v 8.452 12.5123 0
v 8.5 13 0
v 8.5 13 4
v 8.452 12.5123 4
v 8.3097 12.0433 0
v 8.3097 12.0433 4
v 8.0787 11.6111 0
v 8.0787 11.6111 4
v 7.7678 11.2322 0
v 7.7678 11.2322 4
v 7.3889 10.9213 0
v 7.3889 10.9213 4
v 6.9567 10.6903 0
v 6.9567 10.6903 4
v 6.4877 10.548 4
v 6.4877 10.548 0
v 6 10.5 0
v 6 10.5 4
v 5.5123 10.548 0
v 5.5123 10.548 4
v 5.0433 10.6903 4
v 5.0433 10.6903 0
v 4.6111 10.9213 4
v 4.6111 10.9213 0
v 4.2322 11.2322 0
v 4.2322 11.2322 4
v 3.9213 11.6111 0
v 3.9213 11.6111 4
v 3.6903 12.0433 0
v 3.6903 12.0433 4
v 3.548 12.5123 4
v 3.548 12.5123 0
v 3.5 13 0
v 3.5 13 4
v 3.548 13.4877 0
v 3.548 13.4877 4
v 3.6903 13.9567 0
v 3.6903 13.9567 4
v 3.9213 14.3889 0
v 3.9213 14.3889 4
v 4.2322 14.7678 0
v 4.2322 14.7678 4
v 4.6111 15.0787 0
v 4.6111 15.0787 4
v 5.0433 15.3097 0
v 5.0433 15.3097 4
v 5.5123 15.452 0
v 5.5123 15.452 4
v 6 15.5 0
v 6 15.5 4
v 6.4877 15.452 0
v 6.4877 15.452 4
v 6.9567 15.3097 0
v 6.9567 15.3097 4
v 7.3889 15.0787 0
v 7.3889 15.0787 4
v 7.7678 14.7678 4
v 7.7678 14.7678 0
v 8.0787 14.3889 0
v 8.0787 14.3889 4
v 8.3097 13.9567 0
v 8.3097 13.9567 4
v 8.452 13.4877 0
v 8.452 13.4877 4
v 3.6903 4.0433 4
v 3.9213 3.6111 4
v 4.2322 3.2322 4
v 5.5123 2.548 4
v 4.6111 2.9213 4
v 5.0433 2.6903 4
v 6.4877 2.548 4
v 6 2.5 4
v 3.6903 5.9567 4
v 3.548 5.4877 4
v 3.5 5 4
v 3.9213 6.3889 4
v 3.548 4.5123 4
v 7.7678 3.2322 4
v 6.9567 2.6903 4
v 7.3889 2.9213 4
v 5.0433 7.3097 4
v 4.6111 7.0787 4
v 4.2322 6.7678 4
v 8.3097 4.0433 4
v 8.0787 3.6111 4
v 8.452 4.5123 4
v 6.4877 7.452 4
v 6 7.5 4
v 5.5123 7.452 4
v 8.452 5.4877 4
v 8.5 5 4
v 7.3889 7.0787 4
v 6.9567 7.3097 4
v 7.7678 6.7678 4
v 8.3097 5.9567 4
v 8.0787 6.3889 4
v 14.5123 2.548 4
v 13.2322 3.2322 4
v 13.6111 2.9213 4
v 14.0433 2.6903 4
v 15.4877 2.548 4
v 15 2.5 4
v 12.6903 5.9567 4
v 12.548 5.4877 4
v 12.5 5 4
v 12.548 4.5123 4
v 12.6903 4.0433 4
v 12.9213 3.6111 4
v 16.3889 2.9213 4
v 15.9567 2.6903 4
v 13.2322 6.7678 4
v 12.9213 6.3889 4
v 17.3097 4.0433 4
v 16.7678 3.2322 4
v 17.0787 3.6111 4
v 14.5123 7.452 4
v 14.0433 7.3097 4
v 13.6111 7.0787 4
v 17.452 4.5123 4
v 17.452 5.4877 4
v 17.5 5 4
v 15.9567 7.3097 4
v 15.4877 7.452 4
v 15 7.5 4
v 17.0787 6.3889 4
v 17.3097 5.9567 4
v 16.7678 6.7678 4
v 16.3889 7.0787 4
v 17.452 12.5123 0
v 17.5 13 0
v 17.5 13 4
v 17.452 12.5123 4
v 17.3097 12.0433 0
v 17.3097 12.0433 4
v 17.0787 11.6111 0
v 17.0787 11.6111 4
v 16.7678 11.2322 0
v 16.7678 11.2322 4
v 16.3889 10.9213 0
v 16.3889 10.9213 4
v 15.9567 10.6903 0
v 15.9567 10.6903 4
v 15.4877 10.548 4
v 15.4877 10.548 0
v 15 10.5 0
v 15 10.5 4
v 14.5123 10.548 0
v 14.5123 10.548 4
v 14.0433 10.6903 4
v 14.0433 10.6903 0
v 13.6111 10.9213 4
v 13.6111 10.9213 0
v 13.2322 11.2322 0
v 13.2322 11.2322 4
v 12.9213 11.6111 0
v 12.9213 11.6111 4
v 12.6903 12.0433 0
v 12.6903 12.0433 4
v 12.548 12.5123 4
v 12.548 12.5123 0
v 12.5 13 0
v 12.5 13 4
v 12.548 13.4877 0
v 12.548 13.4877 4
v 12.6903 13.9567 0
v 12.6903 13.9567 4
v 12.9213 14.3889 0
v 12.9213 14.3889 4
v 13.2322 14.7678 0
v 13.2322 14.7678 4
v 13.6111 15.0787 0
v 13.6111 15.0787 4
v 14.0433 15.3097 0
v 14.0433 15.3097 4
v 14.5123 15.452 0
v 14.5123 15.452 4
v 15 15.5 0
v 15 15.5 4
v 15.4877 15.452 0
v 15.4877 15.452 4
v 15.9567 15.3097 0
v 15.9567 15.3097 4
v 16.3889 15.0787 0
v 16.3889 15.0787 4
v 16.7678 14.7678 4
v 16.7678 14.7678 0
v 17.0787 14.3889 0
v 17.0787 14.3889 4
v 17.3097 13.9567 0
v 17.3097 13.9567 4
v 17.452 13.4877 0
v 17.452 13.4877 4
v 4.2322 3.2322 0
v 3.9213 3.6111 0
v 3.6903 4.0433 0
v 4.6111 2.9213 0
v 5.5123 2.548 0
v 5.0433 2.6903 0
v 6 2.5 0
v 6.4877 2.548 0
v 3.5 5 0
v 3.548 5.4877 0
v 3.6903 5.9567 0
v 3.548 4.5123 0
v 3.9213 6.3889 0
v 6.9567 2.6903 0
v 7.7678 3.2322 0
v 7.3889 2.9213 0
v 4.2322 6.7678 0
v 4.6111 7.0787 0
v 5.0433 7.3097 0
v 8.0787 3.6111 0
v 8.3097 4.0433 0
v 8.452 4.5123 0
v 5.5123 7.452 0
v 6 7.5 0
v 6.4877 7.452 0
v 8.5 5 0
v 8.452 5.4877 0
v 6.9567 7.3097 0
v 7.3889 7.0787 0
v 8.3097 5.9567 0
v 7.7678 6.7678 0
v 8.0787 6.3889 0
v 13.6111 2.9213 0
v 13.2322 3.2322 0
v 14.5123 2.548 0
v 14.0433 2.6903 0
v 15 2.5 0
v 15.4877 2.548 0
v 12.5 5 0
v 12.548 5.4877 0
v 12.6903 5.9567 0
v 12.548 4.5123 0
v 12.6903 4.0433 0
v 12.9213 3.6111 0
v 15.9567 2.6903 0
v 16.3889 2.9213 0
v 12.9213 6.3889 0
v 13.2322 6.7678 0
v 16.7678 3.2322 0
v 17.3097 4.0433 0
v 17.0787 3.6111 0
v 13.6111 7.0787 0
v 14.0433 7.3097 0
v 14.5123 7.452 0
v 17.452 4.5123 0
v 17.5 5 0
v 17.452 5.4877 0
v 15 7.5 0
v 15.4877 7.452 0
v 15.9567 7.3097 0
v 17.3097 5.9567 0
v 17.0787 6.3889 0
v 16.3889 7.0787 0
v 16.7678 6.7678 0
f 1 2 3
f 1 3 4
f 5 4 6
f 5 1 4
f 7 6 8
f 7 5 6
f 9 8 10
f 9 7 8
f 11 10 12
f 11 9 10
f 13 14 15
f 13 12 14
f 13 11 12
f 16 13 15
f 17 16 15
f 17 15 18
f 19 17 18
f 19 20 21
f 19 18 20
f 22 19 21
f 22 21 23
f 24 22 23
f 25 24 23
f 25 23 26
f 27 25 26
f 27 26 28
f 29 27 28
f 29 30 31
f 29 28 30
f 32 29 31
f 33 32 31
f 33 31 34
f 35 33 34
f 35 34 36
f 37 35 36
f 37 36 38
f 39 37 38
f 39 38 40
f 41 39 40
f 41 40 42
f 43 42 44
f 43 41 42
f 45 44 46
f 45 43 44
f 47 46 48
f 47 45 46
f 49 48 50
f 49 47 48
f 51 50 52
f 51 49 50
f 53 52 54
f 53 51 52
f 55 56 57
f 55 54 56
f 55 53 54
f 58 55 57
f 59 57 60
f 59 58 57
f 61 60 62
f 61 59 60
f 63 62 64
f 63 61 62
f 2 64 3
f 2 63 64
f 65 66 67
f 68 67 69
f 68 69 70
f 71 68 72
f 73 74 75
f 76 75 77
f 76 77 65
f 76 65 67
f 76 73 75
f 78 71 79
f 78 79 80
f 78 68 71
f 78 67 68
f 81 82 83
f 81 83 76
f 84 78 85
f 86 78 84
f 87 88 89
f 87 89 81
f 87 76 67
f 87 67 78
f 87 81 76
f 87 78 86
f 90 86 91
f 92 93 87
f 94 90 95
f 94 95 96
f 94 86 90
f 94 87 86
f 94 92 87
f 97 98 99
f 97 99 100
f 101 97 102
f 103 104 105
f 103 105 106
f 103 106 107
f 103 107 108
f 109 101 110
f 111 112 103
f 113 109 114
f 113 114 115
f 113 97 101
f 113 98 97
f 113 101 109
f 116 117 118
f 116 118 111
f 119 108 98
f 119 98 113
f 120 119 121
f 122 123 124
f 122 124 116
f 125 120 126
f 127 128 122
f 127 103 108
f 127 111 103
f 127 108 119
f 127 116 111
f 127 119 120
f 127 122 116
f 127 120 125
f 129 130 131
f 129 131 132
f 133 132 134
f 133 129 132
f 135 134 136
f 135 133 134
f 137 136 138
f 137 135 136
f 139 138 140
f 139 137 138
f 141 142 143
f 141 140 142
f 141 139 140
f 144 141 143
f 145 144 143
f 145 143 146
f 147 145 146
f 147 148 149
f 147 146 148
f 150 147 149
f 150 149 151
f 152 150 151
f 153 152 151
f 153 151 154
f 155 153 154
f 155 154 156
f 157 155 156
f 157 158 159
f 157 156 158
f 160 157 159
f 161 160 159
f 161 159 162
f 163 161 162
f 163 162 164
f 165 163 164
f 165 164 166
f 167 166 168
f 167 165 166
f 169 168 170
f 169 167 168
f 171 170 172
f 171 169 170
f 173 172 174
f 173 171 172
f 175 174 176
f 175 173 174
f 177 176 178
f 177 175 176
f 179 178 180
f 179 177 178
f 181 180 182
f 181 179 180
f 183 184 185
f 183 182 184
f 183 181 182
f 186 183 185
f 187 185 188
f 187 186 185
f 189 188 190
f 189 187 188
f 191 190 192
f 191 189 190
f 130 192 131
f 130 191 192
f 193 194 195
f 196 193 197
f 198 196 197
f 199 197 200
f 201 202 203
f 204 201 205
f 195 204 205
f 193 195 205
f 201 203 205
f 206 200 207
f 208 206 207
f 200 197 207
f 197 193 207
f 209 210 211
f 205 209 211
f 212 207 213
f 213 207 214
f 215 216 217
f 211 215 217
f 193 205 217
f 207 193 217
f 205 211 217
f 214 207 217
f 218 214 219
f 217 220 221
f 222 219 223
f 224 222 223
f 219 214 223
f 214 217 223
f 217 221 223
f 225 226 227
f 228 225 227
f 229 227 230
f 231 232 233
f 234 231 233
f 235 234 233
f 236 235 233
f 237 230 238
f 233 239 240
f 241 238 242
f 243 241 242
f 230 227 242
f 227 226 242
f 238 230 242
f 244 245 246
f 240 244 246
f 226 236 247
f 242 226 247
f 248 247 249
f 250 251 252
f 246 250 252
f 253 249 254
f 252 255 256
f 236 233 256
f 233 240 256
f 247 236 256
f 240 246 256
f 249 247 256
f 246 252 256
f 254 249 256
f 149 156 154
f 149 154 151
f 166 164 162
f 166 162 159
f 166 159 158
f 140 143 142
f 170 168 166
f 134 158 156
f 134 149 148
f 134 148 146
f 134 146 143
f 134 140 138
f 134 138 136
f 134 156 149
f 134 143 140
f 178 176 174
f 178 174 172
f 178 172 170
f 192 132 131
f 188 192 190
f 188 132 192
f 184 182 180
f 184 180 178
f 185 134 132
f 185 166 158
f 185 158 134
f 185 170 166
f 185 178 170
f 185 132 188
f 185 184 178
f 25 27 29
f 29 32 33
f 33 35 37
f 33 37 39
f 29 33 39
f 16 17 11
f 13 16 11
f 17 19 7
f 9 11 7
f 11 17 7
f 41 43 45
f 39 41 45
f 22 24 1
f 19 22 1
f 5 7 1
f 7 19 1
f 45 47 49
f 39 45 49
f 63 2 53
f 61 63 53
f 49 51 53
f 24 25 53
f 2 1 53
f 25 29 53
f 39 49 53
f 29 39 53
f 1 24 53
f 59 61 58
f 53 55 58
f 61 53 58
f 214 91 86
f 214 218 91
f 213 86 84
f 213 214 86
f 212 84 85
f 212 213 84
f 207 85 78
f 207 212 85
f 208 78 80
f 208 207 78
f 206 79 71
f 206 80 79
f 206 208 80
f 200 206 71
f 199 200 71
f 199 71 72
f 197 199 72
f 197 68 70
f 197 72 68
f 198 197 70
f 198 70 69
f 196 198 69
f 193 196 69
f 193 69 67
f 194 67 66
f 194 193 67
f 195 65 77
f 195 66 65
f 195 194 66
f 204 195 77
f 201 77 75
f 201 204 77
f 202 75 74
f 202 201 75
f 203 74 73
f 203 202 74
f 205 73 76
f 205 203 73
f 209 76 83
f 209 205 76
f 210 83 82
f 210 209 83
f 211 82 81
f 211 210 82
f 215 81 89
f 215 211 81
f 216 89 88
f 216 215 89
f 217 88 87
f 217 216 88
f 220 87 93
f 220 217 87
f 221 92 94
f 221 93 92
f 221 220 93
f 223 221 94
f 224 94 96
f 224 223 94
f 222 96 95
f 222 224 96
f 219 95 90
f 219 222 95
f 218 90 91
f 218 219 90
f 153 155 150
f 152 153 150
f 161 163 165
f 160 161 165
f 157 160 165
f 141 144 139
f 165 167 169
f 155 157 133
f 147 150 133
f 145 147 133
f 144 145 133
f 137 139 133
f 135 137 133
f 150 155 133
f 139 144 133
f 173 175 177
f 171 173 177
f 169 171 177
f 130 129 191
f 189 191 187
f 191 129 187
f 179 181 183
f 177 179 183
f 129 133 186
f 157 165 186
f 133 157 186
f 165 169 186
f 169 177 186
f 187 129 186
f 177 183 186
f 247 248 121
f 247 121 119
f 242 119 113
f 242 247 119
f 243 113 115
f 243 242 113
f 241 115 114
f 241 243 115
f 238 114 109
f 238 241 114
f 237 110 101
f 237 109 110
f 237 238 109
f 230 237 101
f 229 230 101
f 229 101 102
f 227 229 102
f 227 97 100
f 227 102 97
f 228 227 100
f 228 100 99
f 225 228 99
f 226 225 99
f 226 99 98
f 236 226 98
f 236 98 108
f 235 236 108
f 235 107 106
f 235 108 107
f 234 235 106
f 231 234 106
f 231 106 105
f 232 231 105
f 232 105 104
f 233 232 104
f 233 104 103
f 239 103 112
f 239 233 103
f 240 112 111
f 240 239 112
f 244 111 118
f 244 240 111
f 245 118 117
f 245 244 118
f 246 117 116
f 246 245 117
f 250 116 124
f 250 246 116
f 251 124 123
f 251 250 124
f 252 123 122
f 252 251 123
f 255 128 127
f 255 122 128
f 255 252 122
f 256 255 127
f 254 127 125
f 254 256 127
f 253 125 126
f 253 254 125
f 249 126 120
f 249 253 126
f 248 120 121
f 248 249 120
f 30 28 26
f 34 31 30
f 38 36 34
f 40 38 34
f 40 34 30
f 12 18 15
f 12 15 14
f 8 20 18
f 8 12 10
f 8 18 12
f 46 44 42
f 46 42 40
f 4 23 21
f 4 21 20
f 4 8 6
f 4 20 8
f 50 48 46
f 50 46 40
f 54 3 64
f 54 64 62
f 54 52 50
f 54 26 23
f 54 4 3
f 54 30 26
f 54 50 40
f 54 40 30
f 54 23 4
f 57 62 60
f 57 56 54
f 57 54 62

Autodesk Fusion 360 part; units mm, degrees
sketch "Sketch1" plane through (0, 0, 0) normal (0, 0, 1) x (1, 0, 0)
  circle A0 centre (6, 5) radius 2.5
  circle A1 centre (15, 5) radius 2.5
  circle A2 centre (6, 13) radius 2.5
  circle A3 centre (15, 13) radius 2.5
  dimension "d1" = 5
  dimension "d2" = 5
  dimension "d3" = 5
  dimension "d4" = 5
extrude "Extrude1" add sketch "Sketch1" along normal blind 4 contours A2 makes body 1
extrude "Extrude2" add sketch "Sketch1" along normal blind 4 separate body contours A0 makes body 2
extrude "Extrude3" add sketch "Sketch1" along normal blind 4 separate body contours A3 makes body 3
extrude "Extrude4" add sketch "Sketch1" along normal blind 4 separate body contours A1 makes body 4
